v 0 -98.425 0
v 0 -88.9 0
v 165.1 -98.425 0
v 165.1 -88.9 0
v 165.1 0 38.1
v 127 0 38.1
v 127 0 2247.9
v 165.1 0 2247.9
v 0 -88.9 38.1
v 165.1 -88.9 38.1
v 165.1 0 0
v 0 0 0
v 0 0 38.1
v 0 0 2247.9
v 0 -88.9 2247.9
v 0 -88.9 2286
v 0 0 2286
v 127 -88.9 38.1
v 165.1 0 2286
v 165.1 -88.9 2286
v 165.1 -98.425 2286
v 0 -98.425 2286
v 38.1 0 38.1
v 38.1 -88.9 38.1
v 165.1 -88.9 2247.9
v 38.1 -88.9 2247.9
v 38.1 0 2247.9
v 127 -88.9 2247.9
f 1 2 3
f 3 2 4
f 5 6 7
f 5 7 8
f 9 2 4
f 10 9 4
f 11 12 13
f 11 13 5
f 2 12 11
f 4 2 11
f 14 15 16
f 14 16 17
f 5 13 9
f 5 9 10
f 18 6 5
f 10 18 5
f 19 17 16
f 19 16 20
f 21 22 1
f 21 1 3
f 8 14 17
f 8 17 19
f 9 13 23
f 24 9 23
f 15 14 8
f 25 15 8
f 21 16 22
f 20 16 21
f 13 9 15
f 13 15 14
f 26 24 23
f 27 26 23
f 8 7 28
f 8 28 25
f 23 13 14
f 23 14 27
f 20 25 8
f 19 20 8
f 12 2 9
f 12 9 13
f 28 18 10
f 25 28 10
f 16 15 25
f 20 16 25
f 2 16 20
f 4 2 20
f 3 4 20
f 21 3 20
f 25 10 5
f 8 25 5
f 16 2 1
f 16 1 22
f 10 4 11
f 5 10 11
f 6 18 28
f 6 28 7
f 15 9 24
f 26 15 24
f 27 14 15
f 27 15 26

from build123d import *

# Parameters (mm, degrees)
F0_W     = 165.1
F0_H     = 88.9
F1_DEPTH = 38.1
F2_W     = 38.1
F2_H     = 88.9
F3_DEPTH = 2209.8
F4_W     = 165.1
F4_H     = 88.9
F5_DEPTH = 38.1
F6_W     = 165.1
F6_H     = 2286
F7_DEPTH = 9.525


with BuildPart() as f1:
    # F0 (on Top) → F1 (new body)
    with BuildSketch(Plane.XY):
        with Locations((82.55, -44.45)):
            Rectangle(F0_W, F0_H)
    extrude(amount=F1_DEPTH)


with BuildPart() as f3:
    # F2 (on face) → F3 (new body)
    with BuildSketch(Plane.XY.offset(38.1)):
        with Locations((19.05, -44.45)):
            Rectangle(F2_W, F2_H)
    extrude(amount=F3_DEPTH)


with BuildPart() as f3b:
    # F2 (on face) → F3, piece 2 (new body)
    with BuildSketch(Plane.XY.offset(38.1)):
        with Locations((146.05, -44.45)):
            Rectangle(F2_W, F2_H)
    extrude(amount=F3_DEPTH)


with BuildPart() as f5:
    # F4 (on face) → F5 (new body)
    with BuildSketch(Plane.XY.offset(2247.9)):
        with Locations((82.55, -44.45)):
            Rectangle(F4_W, F4_H)
    extrude(amount=F5_DEPTH)


with BuildPart() as f7:
    # F6 (on face) → F7 (new body)
    with BuildSketch(Plane.XZ.offset(88.9)):
        with Locations((82.55, 1143)):
            Rectangle(F6_W, F6_H)
    extrude(amount=F7_DEPTH)


solid = Compound([f1.part, f3.part, f3b.part, f5.part, f7.part])
